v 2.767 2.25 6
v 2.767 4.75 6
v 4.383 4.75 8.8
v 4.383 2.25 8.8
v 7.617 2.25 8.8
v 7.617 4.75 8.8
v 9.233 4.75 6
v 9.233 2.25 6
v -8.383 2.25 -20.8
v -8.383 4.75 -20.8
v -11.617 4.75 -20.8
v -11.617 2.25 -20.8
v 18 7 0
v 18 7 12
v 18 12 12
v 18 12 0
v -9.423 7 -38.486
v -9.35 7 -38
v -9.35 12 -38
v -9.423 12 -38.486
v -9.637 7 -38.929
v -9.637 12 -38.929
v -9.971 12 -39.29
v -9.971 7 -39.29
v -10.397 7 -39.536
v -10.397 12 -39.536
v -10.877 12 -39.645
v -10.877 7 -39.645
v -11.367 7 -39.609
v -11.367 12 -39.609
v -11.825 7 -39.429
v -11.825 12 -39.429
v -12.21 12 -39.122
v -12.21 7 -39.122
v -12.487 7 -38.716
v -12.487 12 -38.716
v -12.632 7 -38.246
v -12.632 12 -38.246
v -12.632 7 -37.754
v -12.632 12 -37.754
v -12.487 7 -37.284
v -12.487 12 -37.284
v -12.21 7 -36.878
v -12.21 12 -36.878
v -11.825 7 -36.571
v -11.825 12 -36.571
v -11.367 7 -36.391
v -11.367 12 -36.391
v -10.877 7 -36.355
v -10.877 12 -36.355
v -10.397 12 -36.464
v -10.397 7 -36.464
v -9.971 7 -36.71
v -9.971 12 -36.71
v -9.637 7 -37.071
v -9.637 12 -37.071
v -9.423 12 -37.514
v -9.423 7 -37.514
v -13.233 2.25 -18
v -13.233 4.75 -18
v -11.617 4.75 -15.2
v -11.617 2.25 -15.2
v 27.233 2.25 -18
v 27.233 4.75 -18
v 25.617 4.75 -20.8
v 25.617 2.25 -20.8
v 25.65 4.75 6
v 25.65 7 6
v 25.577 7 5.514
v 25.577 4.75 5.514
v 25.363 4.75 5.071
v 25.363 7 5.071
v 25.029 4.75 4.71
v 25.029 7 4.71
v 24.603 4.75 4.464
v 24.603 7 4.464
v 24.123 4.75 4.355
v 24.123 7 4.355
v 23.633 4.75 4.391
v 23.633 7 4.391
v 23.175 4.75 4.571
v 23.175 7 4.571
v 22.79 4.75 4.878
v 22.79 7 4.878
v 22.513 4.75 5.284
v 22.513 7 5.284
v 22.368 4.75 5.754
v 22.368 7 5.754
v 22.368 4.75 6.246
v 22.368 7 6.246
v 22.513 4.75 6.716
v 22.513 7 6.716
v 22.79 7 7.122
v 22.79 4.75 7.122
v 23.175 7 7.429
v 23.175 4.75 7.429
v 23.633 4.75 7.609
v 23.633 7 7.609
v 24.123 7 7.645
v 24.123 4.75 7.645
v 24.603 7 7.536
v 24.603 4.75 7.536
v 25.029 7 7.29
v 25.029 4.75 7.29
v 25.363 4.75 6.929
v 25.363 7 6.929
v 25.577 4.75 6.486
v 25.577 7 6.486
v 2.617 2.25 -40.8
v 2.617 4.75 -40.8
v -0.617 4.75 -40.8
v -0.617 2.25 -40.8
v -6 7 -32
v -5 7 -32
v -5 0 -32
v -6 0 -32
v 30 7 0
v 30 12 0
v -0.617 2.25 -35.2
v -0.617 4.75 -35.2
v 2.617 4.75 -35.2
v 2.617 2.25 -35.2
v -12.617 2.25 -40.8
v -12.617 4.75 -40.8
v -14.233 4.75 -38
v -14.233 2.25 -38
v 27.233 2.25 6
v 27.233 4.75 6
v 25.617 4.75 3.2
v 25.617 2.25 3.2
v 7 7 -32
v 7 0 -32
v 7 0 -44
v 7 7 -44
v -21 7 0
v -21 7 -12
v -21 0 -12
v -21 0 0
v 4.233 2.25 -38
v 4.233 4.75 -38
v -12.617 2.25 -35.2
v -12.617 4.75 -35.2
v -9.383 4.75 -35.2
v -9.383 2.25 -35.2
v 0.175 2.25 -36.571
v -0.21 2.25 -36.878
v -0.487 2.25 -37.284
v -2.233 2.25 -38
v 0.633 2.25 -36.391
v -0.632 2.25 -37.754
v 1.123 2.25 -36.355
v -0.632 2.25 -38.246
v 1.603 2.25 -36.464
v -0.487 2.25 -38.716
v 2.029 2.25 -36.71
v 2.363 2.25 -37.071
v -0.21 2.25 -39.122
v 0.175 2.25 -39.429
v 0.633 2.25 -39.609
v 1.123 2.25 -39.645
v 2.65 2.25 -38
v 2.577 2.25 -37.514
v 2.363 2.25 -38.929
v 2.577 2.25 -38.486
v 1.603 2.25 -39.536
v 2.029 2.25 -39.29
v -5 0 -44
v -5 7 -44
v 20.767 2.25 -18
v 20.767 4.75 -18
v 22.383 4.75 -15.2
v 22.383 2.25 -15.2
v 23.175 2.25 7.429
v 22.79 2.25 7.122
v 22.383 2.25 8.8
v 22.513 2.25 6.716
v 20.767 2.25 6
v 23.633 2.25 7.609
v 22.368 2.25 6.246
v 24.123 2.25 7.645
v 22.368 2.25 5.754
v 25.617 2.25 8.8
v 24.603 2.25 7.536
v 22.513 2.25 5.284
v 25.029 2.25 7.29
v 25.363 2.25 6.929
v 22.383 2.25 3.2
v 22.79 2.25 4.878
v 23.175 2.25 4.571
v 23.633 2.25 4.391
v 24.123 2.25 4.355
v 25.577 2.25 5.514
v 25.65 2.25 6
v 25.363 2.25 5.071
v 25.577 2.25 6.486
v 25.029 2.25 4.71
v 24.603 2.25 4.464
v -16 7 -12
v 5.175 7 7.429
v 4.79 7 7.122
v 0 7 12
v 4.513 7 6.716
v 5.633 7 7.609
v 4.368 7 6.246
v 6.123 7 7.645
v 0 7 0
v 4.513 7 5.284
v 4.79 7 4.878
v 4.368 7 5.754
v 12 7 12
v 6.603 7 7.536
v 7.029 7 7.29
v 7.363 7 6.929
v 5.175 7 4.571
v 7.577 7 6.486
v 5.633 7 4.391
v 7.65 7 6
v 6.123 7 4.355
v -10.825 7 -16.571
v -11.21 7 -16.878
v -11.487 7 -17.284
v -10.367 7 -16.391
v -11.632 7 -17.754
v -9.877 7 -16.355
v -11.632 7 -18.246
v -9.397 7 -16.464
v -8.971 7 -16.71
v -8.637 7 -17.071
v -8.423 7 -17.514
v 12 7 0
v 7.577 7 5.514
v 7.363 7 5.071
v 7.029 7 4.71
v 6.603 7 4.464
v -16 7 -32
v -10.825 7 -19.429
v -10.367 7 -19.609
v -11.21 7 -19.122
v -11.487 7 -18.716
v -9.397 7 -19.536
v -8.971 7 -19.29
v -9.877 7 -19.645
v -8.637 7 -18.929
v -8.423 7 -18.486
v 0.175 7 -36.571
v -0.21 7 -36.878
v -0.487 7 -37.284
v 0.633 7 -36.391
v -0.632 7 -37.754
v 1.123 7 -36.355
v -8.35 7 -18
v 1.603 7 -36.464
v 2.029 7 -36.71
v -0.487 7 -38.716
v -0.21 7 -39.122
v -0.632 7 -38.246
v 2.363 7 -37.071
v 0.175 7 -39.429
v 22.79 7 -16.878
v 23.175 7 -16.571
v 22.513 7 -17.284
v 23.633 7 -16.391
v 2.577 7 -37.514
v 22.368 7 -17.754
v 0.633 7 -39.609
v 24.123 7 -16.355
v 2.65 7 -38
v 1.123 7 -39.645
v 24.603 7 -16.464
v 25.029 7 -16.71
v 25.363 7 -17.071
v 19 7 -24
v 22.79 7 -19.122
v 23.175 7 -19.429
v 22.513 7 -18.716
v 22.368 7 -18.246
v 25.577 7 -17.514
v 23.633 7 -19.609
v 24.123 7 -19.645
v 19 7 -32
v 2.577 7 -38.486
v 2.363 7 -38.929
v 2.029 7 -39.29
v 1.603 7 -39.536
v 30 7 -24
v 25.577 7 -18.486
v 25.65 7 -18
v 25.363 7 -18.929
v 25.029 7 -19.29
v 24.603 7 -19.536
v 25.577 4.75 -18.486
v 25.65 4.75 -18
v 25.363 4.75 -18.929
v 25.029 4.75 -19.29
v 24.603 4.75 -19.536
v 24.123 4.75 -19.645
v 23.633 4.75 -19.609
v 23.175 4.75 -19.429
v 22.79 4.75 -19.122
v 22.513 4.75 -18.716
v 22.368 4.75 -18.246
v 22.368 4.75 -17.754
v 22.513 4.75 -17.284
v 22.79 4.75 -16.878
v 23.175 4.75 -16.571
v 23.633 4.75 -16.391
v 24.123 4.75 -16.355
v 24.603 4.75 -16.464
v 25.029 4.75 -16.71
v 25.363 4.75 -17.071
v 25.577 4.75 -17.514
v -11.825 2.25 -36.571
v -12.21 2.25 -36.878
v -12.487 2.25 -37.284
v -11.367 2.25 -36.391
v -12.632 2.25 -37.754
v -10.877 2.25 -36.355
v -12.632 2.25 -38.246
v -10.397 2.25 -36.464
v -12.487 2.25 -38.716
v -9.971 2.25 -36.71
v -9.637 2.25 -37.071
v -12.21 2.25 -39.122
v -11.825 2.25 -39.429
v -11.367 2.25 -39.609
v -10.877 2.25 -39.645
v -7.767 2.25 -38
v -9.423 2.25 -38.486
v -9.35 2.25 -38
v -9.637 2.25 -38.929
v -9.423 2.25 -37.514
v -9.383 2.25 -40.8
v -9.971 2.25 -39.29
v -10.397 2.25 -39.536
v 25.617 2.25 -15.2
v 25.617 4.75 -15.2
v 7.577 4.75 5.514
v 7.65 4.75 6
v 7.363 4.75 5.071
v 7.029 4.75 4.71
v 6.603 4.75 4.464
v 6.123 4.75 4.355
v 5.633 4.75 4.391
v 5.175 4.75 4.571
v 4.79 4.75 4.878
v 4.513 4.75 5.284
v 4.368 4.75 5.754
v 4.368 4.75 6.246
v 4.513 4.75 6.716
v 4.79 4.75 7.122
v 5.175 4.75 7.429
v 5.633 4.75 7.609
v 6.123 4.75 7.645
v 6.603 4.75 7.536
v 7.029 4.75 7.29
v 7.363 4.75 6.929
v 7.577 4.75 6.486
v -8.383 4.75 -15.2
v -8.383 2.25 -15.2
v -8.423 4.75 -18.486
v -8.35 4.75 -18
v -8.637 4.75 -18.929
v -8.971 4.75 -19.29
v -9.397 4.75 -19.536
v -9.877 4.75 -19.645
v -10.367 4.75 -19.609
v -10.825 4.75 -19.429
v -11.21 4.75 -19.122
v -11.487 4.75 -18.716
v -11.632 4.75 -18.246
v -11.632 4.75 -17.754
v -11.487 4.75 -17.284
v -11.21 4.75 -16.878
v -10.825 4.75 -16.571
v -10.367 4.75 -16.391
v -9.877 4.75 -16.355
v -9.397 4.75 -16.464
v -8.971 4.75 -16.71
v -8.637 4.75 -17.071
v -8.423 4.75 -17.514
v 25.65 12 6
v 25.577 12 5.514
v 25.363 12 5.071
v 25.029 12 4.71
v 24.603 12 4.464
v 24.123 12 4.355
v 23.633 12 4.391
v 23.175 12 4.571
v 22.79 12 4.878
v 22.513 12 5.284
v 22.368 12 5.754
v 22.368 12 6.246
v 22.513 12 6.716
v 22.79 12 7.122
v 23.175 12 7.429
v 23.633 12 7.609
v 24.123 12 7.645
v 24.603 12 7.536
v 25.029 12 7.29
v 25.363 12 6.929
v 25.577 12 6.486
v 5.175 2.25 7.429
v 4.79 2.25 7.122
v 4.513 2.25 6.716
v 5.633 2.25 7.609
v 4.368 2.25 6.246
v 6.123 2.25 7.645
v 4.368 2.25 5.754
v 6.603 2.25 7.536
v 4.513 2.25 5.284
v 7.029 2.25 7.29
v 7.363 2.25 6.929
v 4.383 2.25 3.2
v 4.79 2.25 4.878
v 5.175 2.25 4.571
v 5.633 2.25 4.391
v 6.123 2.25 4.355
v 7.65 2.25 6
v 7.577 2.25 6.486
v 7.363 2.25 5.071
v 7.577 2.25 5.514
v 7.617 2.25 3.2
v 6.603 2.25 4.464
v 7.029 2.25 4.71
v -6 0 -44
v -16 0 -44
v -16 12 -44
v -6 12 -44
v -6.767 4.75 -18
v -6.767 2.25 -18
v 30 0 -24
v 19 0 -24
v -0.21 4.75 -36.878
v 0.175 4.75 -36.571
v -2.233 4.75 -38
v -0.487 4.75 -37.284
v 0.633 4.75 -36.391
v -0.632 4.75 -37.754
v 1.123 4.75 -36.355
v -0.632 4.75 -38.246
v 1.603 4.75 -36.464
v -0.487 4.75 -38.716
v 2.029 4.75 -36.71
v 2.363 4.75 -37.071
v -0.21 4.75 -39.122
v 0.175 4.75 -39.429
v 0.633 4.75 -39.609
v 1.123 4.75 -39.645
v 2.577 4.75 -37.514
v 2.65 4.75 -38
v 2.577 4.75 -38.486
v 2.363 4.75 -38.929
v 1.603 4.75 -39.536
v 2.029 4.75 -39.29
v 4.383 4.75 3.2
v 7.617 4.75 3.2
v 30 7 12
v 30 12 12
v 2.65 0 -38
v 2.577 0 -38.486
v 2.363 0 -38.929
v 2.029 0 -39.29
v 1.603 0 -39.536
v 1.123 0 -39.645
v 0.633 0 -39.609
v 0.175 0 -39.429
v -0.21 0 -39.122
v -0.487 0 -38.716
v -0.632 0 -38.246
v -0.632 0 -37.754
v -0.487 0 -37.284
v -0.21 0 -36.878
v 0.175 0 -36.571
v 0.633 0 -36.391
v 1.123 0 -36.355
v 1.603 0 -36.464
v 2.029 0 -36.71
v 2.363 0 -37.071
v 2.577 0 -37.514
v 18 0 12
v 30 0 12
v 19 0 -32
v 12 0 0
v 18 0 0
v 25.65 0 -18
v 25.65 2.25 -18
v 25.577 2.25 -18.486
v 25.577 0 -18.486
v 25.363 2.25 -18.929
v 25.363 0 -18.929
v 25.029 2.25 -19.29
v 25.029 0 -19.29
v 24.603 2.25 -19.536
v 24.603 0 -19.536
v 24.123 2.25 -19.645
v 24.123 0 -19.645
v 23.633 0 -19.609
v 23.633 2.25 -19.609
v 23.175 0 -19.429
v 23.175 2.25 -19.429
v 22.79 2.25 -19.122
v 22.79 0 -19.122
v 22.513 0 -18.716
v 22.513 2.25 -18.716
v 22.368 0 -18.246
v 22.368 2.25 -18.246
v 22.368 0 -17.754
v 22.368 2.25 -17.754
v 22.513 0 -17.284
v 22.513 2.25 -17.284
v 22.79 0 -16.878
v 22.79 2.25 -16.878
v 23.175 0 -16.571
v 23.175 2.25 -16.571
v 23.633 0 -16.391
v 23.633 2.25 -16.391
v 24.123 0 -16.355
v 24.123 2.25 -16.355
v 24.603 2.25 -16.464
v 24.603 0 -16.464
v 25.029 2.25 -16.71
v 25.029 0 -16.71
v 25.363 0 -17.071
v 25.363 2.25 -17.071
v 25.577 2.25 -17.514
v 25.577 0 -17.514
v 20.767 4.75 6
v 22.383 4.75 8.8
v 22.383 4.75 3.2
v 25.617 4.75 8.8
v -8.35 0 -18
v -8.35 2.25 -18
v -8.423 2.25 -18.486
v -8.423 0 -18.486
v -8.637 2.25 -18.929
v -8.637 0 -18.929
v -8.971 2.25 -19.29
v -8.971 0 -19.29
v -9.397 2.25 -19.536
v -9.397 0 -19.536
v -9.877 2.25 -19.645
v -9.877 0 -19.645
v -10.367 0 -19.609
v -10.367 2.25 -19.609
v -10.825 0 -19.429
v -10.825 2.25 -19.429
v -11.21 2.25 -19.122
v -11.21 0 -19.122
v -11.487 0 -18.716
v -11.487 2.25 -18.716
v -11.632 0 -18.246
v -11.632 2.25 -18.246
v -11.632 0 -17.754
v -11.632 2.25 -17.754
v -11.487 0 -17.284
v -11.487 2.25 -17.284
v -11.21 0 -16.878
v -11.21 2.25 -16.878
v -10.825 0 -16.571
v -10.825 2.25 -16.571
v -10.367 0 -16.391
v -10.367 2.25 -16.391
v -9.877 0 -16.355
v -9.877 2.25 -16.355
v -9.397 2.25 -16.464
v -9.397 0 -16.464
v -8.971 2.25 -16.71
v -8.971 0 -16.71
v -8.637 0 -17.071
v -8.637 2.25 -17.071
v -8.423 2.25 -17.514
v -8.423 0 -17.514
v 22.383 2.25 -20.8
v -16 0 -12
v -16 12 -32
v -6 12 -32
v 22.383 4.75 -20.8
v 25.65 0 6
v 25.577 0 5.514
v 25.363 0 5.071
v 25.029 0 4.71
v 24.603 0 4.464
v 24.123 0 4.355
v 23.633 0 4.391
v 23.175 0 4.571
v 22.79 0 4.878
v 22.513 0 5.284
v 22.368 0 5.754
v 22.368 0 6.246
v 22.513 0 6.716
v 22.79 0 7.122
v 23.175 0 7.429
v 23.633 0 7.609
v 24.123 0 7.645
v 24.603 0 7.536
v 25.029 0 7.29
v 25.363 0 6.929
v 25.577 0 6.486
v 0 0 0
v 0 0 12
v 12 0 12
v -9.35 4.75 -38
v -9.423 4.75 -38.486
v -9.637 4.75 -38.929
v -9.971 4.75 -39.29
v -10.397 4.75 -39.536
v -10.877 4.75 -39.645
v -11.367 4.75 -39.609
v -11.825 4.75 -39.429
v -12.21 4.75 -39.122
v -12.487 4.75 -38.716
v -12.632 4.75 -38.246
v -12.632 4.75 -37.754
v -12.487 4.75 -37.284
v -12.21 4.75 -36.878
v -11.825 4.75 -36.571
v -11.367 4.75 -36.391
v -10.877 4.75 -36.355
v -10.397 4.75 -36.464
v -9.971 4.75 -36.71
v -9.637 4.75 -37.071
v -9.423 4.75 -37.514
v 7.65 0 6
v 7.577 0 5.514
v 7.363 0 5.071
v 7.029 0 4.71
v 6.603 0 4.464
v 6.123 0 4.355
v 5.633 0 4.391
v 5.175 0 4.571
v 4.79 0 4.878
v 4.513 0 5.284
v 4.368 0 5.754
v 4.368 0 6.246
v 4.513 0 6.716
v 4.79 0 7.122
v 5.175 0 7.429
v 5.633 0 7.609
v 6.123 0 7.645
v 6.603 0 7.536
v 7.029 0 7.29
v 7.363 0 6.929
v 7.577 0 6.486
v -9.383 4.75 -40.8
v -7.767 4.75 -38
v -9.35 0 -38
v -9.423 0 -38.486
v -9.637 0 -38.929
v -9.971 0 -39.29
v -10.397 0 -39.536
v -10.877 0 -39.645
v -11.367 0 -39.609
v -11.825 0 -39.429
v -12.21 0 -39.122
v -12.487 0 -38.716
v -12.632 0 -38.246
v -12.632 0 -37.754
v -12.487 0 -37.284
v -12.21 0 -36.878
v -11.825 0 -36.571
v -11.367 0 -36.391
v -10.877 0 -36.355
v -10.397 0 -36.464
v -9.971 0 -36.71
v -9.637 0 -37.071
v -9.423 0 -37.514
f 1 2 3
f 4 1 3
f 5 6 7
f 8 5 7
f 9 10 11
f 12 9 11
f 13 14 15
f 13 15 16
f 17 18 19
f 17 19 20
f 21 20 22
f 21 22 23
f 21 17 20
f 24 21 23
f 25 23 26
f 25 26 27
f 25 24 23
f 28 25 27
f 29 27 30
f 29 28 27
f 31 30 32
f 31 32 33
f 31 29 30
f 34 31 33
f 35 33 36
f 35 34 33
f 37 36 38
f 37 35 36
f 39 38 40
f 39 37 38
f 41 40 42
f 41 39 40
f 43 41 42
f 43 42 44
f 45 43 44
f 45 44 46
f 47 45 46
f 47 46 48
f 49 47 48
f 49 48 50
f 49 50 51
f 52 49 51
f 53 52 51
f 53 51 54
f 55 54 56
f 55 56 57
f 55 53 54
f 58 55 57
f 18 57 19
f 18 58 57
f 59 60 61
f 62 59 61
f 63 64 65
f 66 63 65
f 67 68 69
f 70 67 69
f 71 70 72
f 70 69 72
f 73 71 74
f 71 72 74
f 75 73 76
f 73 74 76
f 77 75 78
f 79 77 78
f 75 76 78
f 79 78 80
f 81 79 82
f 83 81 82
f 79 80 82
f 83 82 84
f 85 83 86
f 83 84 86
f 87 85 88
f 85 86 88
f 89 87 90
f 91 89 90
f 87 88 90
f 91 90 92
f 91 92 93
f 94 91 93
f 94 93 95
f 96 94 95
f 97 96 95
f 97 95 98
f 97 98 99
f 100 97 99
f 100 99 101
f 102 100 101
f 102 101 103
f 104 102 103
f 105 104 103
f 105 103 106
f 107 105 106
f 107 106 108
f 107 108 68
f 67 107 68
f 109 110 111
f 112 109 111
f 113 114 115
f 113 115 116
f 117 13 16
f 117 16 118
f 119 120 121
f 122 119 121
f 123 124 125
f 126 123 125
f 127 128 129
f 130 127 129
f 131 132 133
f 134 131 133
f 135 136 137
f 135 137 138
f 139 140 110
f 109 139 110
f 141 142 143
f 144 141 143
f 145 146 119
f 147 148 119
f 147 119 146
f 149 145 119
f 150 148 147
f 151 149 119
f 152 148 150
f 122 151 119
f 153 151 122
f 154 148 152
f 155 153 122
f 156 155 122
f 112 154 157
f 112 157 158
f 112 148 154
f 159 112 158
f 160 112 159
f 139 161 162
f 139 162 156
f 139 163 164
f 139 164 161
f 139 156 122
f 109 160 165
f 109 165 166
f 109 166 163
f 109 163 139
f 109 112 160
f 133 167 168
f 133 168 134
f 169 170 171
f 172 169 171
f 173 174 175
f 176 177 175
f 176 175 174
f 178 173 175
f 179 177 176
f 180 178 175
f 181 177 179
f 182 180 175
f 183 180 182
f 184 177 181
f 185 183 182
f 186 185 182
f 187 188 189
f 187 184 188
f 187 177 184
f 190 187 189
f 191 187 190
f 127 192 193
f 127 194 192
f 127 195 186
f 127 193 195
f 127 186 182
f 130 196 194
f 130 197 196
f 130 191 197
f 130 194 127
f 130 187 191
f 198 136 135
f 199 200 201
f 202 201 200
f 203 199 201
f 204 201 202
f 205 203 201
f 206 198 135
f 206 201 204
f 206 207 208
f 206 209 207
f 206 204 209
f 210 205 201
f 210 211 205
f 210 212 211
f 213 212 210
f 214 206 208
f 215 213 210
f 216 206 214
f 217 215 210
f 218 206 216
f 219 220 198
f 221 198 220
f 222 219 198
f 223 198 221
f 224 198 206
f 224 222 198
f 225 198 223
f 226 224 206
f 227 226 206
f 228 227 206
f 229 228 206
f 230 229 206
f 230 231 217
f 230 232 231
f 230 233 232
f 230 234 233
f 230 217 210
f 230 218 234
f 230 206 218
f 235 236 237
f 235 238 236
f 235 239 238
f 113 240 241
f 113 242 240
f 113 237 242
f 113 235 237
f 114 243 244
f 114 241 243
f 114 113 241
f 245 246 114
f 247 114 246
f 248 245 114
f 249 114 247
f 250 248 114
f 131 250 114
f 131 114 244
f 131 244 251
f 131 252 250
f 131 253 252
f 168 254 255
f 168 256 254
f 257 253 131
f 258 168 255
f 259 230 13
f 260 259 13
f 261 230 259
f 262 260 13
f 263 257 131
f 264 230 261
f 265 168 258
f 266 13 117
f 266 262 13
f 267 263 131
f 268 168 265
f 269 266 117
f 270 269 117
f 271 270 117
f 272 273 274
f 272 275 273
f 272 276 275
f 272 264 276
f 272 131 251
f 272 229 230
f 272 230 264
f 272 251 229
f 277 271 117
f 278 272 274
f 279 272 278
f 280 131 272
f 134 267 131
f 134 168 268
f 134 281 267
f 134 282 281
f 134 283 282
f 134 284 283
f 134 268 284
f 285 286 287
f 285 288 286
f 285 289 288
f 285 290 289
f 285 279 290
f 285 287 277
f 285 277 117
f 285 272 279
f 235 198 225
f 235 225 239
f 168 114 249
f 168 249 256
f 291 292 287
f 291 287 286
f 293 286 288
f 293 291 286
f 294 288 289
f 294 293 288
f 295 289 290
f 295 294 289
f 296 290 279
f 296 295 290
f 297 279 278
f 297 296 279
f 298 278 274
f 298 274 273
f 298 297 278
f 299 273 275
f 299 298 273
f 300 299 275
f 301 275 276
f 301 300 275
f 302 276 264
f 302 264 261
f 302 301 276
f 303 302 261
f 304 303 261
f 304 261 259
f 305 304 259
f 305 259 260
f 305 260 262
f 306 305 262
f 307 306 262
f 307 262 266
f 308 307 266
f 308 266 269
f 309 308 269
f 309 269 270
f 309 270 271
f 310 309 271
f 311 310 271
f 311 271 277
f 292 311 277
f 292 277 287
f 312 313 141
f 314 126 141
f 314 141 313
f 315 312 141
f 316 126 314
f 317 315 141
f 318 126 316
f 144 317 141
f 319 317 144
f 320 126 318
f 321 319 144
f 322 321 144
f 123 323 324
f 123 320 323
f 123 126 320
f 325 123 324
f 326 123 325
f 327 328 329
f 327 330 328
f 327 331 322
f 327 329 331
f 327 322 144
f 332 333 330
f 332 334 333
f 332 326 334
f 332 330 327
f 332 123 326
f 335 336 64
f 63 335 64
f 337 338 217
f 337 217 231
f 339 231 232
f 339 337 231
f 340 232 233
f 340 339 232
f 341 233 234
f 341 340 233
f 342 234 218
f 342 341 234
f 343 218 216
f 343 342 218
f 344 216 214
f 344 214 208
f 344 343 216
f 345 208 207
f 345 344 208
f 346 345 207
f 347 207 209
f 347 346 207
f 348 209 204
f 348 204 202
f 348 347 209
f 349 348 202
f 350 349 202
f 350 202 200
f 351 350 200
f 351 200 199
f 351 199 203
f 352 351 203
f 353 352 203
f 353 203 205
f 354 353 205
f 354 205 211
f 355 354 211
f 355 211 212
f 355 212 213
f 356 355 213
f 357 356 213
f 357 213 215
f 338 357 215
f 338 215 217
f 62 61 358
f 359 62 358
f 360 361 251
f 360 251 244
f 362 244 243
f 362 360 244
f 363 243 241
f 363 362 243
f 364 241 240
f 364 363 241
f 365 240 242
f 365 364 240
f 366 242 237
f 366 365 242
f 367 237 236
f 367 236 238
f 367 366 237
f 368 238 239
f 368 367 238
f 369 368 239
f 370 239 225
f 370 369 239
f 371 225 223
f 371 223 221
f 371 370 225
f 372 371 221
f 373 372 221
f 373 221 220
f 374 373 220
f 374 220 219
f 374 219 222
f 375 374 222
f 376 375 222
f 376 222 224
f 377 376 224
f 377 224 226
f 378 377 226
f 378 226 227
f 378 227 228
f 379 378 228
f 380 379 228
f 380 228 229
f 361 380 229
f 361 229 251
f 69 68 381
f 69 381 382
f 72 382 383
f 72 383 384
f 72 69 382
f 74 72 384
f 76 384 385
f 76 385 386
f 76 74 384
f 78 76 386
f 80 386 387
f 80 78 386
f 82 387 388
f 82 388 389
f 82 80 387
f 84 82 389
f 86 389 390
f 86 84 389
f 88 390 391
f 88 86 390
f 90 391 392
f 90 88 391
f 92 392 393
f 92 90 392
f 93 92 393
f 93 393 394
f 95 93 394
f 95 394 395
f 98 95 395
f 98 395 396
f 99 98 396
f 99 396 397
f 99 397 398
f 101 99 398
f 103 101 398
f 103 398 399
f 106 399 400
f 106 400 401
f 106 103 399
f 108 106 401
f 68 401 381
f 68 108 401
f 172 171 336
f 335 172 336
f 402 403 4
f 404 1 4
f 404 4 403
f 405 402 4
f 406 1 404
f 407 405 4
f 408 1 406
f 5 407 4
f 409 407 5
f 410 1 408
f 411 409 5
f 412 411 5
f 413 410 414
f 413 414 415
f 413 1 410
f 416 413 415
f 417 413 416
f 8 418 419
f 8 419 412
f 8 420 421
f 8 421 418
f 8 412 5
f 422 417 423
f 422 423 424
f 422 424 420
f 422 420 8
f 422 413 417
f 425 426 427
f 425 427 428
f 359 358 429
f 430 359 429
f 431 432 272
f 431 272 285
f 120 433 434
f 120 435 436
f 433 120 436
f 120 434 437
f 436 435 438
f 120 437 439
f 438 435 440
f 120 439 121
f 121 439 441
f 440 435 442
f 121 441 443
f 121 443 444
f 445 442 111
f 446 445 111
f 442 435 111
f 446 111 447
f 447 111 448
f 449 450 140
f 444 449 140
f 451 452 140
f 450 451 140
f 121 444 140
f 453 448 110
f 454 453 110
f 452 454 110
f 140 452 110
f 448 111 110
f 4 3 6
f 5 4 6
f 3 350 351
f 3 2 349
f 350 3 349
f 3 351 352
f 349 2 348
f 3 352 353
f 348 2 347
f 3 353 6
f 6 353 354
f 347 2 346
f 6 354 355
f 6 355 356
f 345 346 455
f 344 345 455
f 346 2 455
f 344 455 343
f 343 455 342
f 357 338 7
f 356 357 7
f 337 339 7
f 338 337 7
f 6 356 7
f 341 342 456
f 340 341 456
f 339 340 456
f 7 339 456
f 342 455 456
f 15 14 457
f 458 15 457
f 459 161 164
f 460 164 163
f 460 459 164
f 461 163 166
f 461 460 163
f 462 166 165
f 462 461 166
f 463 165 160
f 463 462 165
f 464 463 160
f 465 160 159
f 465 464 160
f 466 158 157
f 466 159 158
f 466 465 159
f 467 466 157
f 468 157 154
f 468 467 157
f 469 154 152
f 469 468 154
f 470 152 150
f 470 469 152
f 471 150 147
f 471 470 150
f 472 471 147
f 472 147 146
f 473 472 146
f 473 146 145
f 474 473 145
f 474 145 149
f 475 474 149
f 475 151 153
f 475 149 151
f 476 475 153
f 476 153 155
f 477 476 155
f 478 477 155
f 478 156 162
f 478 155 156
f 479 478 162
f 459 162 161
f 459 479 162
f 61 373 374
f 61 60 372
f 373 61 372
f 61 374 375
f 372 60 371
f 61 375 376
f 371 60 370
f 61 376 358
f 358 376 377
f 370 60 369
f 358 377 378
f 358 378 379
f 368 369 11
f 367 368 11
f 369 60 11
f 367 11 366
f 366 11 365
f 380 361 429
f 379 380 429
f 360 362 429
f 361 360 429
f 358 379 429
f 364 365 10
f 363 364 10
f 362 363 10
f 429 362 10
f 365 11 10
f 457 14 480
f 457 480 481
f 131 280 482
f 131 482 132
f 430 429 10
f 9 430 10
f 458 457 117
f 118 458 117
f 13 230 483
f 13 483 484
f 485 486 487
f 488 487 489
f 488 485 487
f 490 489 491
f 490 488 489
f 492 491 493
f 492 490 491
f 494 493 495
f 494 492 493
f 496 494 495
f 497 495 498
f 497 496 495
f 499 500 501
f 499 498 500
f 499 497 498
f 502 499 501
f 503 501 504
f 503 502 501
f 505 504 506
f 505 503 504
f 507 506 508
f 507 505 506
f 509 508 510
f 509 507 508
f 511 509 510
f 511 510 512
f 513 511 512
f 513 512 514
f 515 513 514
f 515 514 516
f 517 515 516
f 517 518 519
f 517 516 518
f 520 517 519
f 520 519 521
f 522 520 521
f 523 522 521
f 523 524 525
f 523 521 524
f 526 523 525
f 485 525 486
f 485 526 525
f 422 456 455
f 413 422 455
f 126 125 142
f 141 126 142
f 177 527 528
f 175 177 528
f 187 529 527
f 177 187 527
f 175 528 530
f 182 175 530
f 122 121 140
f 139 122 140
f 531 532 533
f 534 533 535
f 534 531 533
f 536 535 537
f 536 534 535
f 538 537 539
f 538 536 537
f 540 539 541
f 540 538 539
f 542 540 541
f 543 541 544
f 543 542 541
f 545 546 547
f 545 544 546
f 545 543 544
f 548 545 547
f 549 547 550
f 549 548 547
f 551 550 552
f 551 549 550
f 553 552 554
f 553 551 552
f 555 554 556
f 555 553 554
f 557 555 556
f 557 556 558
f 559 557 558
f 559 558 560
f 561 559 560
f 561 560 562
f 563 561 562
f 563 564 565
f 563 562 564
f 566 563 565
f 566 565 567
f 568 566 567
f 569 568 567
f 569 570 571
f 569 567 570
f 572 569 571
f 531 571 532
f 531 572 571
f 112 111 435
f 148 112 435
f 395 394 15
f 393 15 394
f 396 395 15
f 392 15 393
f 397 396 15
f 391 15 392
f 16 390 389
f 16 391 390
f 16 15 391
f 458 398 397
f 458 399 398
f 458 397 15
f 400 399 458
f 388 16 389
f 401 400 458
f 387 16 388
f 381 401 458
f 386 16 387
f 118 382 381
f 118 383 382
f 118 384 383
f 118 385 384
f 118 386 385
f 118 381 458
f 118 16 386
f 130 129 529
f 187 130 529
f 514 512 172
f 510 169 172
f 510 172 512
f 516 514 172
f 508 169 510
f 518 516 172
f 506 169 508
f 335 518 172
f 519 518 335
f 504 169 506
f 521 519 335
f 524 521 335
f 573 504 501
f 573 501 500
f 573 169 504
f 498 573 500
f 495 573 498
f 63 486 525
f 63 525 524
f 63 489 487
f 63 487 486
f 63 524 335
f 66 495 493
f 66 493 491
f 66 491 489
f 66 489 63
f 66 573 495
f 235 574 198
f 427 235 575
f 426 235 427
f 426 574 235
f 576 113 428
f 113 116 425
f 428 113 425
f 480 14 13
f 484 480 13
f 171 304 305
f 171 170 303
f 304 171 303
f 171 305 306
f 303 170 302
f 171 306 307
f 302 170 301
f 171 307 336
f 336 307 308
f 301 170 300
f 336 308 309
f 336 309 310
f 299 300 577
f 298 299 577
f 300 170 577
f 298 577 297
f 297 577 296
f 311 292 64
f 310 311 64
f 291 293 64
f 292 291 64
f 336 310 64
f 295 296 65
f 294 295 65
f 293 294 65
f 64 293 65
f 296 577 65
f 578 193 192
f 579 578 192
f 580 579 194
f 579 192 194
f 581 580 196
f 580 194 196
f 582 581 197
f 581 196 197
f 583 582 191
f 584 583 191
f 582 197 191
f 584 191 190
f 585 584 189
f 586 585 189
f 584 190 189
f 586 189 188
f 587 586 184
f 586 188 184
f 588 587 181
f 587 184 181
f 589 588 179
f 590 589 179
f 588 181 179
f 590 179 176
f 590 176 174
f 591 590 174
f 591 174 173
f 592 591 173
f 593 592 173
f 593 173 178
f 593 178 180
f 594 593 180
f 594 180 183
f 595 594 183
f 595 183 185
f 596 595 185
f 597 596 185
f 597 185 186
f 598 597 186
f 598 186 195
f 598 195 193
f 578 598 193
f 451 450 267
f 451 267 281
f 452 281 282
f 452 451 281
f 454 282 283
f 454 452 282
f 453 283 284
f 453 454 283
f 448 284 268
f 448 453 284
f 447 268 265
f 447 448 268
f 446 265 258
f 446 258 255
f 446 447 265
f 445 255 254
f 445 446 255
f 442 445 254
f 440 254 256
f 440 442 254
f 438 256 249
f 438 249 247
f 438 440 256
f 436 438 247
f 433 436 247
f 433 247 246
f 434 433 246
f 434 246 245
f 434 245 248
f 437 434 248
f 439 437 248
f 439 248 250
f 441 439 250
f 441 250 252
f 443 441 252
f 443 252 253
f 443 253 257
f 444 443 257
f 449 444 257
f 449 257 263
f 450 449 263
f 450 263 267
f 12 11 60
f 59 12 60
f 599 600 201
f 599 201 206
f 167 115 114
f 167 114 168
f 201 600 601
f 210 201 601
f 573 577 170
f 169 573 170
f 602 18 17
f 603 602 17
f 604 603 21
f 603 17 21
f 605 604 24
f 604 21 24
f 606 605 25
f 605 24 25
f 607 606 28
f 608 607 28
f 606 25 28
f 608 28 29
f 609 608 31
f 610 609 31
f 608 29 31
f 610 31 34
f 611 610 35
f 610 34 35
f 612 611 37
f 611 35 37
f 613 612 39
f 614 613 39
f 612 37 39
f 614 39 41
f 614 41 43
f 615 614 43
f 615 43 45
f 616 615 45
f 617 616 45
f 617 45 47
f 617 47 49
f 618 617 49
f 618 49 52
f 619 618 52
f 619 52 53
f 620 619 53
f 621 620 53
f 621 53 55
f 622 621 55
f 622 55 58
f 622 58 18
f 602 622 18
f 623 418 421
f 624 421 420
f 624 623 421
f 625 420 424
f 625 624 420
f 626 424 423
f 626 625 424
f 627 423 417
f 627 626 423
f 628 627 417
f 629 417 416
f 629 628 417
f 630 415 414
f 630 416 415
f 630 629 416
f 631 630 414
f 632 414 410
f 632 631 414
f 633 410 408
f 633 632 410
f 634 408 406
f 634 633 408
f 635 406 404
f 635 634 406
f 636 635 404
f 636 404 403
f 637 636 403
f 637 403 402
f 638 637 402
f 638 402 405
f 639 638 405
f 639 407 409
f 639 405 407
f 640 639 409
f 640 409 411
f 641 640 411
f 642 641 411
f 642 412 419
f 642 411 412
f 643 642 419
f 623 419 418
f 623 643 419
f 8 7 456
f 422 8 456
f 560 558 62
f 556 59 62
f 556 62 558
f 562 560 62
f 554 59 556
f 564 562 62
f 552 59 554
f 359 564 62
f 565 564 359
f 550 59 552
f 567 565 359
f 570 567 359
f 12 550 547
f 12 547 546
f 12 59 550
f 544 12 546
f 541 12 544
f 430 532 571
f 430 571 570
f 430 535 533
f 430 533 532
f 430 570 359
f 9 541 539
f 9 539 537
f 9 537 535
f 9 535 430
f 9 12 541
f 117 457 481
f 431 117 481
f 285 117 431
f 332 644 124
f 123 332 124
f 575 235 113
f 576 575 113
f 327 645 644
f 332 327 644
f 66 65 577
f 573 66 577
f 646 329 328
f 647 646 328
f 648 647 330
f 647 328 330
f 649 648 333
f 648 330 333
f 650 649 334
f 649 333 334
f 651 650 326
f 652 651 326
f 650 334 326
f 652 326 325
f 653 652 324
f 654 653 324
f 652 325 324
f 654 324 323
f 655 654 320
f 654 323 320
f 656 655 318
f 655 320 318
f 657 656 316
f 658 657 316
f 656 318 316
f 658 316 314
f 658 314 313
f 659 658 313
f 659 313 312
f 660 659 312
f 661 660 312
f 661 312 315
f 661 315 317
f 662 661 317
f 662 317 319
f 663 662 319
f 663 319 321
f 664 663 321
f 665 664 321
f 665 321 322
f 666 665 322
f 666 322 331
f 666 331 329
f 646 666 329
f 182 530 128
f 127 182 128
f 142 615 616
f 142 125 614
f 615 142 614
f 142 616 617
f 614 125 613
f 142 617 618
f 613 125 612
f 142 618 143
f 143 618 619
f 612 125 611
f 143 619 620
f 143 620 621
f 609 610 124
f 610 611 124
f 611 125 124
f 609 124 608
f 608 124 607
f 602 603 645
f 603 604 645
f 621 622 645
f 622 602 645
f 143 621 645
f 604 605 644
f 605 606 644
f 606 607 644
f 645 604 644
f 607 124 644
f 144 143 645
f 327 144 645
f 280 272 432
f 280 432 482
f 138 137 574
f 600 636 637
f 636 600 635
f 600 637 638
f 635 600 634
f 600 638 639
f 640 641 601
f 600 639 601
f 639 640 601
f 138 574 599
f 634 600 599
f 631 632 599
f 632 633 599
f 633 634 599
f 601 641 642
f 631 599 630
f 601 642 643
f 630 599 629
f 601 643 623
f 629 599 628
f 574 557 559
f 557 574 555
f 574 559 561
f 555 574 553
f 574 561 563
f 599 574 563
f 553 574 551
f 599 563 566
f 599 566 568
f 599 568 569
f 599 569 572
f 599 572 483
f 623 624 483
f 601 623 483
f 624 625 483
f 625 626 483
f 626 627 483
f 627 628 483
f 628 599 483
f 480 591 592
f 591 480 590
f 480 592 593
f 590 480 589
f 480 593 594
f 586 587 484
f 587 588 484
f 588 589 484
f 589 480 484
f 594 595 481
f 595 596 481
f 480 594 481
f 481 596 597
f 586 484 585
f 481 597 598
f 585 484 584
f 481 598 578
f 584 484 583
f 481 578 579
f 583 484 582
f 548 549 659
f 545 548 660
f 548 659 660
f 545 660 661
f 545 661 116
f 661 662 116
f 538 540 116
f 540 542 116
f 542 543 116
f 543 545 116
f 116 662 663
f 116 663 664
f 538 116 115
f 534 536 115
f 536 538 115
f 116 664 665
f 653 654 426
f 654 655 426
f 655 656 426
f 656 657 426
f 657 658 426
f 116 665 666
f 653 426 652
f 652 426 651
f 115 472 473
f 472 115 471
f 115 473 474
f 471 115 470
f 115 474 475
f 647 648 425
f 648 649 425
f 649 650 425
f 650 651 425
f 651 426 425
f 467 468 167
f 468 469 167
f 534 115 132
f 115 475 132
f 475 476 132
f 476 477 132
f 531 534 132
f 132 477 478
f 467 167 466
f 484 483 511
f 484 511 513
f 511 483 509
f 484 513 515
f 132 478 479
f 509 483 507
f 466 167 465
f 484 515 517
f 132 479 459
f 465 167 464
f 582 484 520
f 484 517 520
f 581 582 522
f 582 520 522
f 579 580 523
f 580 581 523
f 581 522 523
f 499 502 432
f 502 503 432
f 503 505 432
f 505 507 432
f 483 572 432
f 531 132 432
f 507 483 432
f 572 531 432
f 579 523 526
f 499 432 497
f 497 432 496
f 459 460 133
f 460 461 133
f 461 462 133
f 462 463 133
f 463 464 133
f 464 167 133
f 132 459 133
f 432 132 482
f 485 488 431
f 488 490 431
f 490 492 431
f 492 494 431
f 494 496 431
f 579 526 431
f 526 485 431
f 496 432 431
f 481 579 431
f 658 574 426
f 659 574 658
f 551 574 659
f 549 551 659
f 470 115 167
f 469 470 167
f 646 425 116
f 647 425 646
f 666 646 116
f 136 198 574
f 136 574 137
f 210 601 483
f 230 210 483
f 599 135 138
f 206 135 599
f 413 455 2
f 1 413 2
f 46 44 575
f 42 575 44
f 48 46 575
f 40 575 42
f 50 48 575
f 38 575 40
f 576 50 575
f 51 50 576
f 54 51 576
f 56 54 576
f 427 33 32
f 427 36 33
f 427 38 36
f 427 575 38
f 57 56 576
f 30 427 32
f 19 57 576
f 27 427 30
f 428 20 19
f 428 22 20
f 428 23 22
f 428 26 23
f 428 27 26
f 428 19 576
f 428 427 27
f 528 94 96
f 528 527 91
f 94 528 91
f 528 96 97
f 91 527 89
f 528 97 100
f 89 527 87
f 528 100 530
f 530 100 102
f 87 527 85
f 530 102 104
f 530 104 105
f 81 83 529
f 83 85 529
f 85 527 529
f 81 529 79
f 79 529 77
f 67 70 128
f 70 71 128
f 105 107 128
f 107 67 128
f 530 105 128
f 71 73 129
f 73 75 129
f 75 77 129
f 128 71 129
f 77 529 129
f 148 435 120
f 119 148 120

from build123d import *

# Parameters (mm, degrees)
SKETCH1_W             = 12
SKETCH1_H             = 12
SKETCH1_R             = 1.65
BOSS_EXTRUDE1_DEPTH   = 7
BOSS_EXTRUDE1_2_DEPTH = 7
BOSS_EXTRUDE1_3_DEPTH = 7
BOSS_EXTRUDE1_4_DEPTH = 7
CUT_EXTRUDE1_START    = -2.25
CUT_EXTRUDE1_DEPTH    = 2.5
SKETCH3_W             = 22
SKETCH3_H             = 12
BOSS_EXTRUDE2_DEPTH   = 7
SKETCH4_W             = 10
SKETCH4_H             = 12
SKETCH4_R             = 1.65
SKETCH4_W_2           = 12
BOSS_EXTRUDE3_DEPTH   = 7
CUT_EXTRUDE2_START    = -2.25
CUT_EXTRUDE2_DEPTH    = 2.5
SKETCH6_W             = 10
SKETCH6_H             = 12
SKETCH6_R             = 1.65
SKETCH6_W_2           = 12
BOSS_EXTRUDE4_DEPTH   = 5


with BuildPart() as part:
    # Sketch1 → Boss-Extrude1 (new body)
    with BuildSketch(Plane(origin=(0, 0, 0), x_dir=(1, 0, 0), z_dir=(0, 1, 0))):
        with Locations((1, 38)):
            Rectangle(SKETCH1_W, SKETCH1_H)
        with Locations((1, 38)):
            Circle(SKETCH1_R, mode=Mode.SUBTRACT)
    extrude(amount=BOSS_EXTRUDE1_DEPTH)


with BuildPart() as body_2:
    # Sketch1 → Boss-Extrude1 2 (new body)
    with BuildSketch(Plane(origin=(0, 0, 0), x_dir=(1, 0, 0), z_dir=(0, 1, 0))):
        with Locations((6, -6)):
            Rectangle(SKETCH1_W, SKETCH1_H)
        with Locations((6, -6)):
            Circle(SKETCH1_R, mode=Mode.SUBTRACT)
    extrude(amount=BOSS_EXTRUDE1_2_DEPTH)


with BuildPart() as body_3:
    # Sketch1 → Boss-Extrude1 3 (new body)
    with BuildSketch(Plane(origin=(0, 0, 0), x_dir=(1, 0, 0), z_dir=(0, 1, 0))):
        with Locations((-10, 18)):
            Rectangle(SKETCH1_W, SKETCH1_H)
        with Locations((-10, 18)):
            Circle(SKETCH1_R, mode=Mode.SUBTRACT)
    extrude(amount=BOSS_EXTRUDE1_3_DEPTH)


with BuildPart() as body_4:
    # Sketch1 → Boss-Extrude1 4 (new body)
    with BuildSketch(Plane(origin=(0, 0, 0), x_dir=(1, 0, 0), z_dir=(0, 1, 0))):
        with Locations((24, 18)):
            Rectangle(SKETCH1_W, SKETCH1_H)
        with Locations((24, 18)):
            Circle(SKETCH1_R, mode=Mode.SUBTRACT)
    extrude(amount=BOSS_EXTRUDE1_4_DEPTH)


with BuildPart() as cut_extrude1_tool:
    # Sketch2 → Cut-Extrude1 (new body)
    with BuildSketch(Plane(origin=(0, 7, 0), x_dir=(1, 0, 0), z_dir=(0, 1, 0)).offset(CUT_EXTRUDE1_START)):
        Polygon((9.233161507, -6), (7.616580754, -3.2), (4.383419246, -3.2), (2.766838493, -6), (4.383419246, -8.8), (7.616580754, -8.8), align=None)
        Polygon((20.766838493, 18), (22.383419246, 15.2), (25.616580754, 15.2), (27.233161507, 18), (25.616580754, 20.8), (22.383419246, 20.8), align=None)
        Polygon((-2.233161507, 38), (-0.616580754, 35.2), (2.616580754, 35.2), (4.233161507, 38), (2.616580754, 40.8), (-0.616580754, 40.8), align=None)
        Polygon((-13.233161507, 18), (-11.616580754, 15.2), (-8.383419246, 15.2), (-6.766838493, 18), (-8.383419246, 20.8), (-11.616580754, 20.8), align=None)
    extrude(amount=-CUT_EXTRUDE1_DEPTH)


with BuildPart() as part_1:
    add(part.part)

    # Cut-Extrude1: cut by cut_extrude1_tool
    add(cut_extrude1_tool.part, mode=Mode.SUBTRACT)



with BuildPart() as body_2_1:
    add(body_2.part)

    # Cut-Extrude1: cut by cut_extrude1_tool
    add(cut_extrude1_tool.part, mode=Mode.SUBTRACT)


with BuildPart() as body_3_1:
    add(body_3.part)

    # Cut-Extrude1: cut by cut_extrude1_tool
    add(cut_extrude1_tool.part, mode=Mode.SUBTRACT)


with BuildPart() as body_4_1:
    add(body_4.part)

    # Cut-Extrude1: cut by cut_extrude1_tool
    add(cut_extrude1_tool.part, mode=Mode.SUBTRACT)


with BuildPart() as part_2:
    add(part_1.part)

    add(body_2_1.part)  # Boss-Extrude2 merges body 2

    add(body_3_1.part)  # Boss-Extrude2 merges body 3

    add(body_4_1.part)  # Boss-Extrude2 merges body 4
    # Sketch3 → Boss-Extrude2 (add)
    with BuildSketch(Plane(origin=(0, 7, 0), x_dir=(1, 0, 0), z_dir=(0, 1, 0))):
        Polygon((-16, 24), (-4, 24), (18, 24), (19, 24), (19, 32), (-16, 32), align=None)
        with Locations((7, 18)):
            Rectangle(SKETCH3_W, SKETCH3_H)
        Polygon((-21, 12), (-21, 0), (0, 0), (12, 0), (30, 0), (30, 12), (18, 12), (-4, 12), align=None)
    extrude(amount=-BOSS_EXTRUDE2_DEPTH)

    # Sketch4 → Boss-Extrude3 (add)
    with BuildSketch(Plane(origin=(0, 7, 0), x_dir=(1, 0, 0), z_dir=(0, 1, 0))):
        with Locations((-11, 38)):
            Rectangle(SKETCH4_W, SKETCH4_H)
        with Locations((-11, 38)):
            Circle(SKETCH4_R, mode=Mode.SUBTRACT)
        with Locations((24, -6)):
            Rectangle(SKETCH4_W_2, SKETCH4_H)
        with Locations((24, -6)):
            Circle(SKETCH4_R, mode=Mode.SUBTRACT)
    extrude(amount=-BOSS_EXTRUDE3_DEPTH)

    # Sketch5 → Cut-Extrude2 (cut)
    with BuildSketch(Plane(origin=(0, 7, 0), x_dir=(1, 0, 0), z_dir=(0, 1, 0)).offset(CUT_EXTRUDE2_START)):
        Polygon((-7.766838493, 38), (-9.383419246, 40.8), (-12.616580754, 40.8), (-14.233161507, 38), (-12.616580754, 35.2), (-9.383419246, 35.2), align=None)
        Polygon((27.233161507, -6), (25.616580754, -3.2), (22.383419246, -3.2), (20.766838493, -6), (22.383419246, -8.8), (25.616580754, -8.8), align=None)
    extrude(amount=-CUT_EXTRUDE2_DEPTH, mode=Mode.SUBTRACT)

    # Sketch6 → Boss-Extrude4 (add)
    with BuildSketch(Plane(origin=(0, 7, 0), x_dir=(1, 0, 0), z_dir=(0, 1, 0))):
        with Locations((-11, 38)):
            Rectangle(SKETCH6_W, SKETCH6_H)
        with Locations((-11, 38)):
            Circle(SKETCH6_R, mode=Mode.SUBTRACT)
        with Locations((24, -6)):
            Rectangle(SKETCH6_W_2, SKETCH6_H)
        with Locations((24, -6)):
            Circle(SKETCH6_R, mode=Mode.SUBTRACT)
    extrude(amount=BOSS_EXTRUDE4_DEPTH)


solid = part_2.part
